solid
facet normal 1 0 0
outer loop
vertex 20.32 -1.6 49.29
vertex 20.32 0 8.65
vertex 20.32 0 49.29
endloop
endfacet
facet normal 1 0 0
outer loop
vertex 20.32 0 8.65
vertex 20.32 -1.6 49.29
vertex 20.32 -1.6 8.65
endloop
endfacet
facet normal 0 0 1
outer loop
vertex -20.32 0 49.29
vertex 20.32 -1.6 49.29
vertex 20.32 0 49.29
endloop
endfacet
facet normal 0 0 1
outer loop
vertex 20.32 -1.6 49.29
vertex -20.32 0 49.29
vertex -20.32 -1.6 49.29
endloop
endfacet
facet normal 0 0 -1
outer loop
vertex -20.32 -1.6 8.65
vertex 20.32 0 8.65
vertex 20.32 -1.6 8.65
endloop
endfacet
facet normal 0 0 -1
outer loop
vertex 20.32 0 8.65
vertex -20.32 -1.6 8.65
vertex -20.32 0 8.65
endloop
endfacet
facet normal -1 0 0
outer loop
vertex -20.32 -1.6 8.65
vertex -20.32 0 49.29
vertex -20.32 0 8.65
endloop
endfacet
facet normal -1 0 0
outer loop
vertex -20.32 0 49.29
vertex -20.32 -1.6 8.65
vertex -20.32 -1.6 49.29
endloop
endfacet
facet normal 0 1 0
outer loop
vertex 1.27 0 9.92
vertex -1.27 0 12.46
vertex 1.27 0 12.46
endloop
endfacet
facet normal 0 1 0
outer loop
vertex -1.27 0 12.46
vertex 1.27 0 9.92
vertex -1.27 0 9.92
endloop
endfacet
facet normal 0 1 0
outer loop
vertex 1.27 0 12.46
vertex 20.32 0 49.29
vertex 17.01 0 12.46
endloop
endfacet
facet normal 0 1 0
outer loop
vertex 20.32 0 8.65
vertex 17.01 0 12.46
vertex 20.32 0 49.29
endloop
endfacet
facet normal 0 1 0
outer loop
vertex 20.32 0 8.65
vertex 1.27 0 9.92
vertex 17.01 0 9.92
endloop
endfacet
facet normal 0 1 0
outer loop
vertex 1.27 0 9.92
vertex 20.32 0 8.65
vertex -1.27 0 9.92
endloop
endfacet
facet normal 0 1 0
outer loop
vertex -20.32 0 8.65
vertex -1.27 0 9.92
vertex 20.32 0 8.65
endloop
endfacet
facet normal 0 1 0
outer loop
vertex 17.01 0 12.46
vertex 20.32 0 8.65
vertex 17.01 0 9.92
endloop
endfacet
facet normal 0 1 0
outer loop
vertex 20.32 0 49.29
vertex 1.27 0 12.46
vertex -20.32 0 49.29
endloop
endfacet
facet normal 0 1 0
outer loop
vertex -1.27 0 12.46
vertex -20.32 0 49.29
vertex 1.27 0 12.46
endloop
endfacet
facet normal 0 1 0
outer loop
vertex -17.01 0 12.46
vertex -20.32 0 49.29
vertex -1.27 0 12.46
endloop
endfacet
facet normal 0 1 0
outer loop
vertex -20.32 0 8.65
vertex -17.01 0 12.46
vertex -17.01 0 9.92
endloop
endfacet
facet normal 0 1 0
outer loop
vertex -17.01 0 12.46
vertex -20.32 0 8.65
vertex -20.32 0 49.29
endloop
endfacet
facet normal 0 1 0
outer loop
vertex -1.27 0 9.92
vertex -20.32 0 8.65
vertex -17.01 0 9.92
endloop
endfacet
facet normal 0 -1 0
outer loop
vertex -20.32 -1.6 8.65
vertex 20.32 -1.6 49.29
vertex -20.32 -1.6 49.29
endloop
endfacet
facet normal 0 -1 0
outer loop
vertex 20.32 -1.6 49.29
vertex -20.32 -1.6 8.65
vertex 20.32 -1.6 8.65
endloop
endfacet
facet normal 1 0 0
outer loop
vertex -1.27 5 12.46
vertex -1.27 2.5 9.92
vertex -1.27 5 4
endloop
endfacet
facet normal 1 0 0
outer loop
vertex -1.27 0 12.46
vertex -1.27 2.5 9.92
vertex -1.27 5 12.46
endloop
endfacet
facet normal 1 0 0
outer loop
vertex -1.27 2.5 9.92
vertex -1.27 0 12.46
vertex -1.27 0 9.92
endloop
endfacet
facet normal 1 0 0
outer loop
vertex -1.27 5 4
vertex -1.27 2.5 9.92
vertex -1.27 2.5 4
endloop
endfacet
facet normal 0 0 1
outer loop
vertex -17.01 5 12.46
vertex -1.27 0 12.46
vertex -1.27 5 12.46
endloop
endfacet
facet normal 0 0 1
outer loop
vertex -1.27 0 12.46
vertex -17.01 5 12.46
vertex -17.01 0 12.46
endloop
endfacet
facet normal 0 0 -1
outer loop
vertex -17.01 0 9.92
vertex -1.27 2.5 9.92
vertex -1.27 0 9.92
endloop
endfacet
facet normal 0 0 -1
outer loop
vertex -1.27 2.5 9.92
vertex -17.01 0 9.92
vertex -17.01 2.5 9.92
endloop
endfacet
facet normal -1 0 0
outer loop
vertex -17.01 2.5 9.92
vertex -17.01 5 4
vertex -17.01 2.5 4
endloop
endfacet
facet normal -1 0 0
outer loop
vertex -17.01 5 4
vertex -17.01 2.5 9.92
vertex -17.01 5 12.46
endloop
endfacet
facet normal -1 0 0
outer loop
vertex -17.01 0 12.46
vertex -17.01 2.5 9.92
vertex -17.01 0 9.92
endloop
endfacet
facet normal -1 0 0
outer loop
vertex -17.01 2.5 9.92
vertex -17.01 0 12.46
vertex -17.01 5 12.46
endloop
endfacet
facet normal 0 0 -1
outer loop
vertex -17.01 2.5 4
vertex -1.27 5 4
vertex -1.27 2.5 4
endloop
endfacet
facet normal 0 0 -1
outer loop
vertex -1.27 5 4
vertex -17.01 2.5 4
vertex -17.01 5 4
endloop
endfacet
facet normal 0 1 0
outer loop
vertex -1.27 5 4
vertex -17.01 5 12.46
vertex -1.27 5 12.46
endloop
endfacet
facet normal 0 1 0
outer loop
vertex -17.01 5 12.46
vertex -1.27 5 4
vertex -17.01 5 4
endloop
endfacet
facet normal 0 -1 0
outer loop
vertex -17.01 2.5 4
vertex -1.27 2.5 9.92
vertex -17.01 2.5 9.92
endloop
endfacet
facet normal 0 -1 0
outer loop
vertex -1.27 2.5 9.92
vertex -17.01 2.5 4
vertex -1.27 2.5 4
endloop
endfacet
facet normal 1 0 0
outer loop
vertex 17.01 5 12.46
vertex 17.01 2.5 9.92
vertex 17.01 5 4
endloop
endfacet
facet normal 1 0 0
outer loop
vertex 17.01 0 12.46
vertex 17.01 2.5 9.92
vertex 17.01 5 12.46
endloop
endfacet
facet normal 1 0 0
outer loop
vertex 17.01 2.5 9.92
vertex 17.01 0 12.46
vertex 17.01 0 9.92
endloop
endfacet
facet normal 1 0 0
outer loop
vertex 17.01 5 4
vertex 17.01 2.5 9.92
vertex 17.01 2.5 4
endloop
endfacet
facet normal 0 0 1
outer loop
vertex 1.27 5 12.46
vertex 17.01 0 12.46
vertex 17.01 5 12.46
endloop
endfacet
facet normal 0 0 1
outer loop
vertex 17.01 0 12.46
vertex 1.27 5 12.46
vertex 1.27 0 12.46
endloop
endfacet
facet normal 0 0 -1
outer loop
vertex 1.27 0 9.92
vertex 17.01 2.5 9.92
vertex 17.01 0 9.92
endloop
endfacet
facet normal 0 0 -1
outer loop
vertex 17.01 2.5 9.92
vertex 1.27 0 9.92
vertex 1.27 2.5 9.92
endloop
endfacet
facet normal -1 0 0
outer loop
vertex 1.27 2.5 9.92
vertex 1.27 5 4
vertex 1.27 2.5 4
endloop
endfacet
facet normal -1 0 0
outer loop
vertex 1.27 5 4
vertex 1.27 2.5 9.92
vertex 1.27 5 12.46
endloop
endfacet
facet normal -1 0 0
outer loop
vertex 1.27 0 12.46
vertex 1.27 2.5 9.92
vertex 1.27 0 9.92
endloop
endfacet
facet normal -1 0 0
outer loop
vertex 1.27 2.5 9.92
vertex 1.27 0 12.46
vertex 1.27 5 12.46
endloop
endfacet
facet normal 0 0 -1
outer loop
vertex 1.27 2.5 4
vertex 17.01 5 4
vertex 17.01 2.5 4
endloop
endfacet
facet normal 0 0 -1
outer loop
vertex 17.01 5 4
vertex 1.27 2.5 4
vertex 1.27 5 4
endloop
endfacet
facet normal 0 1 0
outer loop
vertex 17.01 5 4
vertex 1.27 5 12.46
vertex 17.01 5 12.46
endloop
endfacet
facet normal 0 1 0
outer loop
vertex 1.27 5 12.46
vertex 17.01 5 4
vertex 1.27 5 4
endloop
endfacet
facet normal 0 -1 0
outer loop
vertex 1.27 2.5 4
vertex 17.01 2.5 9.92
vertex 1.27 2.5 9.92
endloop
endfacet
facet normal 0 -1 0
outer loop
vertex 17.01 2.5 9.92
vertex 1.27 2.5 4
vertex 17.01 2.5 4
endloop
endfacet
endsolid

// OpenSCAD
// file: measurements.scad
function cartridge_pad_spacing() = 2.54;

function cartridge_wall_sides() = 32;
function cartridge_pcb_width() = cartridge_pad_spacing() * 16;
function cartridge_pcb_height() = cartridge_pad_spacing() * 16;
function cartridge_pcb_thickness() = 1.6;
function cartridge_pcb_margin() = 1.6;
function cartridge_pcb_tolerance() = 0.25;
function cartridge_pcb_front_clearance() = 3;
function cartridge_pcb_back_clearance() = 5;

function cartridge_connector_pin_height() = 2.5;
function cartridge_connector_stand_height() = 2.5;
function cartridge_connector_stand_width() = cartridge_pad_spacing() * 6 + 0.5;
function cartridge_connector_stand_length() = cartridge_pad_spacing();
function cartridge_connector_stand_inset() = cartridge_pad_spacing() / 2;
function cartridge_connector_pin_protrusion() = 4.4;
function cartridge_connector_pin_inset() = 4;
function cartridge_connector_tolerance() = 0.25;
function cartridge_connector_spacing() = cartridge_pad_spacing();

function cartridge_engraving_margin() = 2;
function cartridge_logo_height() = 3;
function cartridge_engraving_radius() = 2;
function cartridge_arrow_width() = 6;
function cartridge_arrow_height() = 3;
function cartridge_engraving_depth() = 0.4;
function cartridge_engraving_sides() = 32;

function cartridge_wall_thickness() = 1.6;

function cartridge_friction_fit_tolerance() = -0.05;

function cartridge_width() = cartridge_wall_thickness() + cartridge_pcb_tolerance() + cartridge_pcb_width() + cartridge_pcb_tolerance() + cartridge_wall_thickness();
function cartridge_height() = cartridge_connector_pin_inset() + cartridge_connector_pin_protrusion() + cartridge_pcb_height() + cartridge_pcb_tolerance() + cartridge_wall_thickness();
function cartridge_depth() = cartridge_engraving_depth() + cartridge_wall_thickness() + cartridge_pcb_front_clearance() + cartridge_pcb_tolerance() + cartridge_pcb_thickness() + cartridge_pcb_tolerance() + cartridge_pcb_back_clearance() + cartridge_wall_thickness();

function cartridge_slot_tolerance() = 0.175;
// main file
use <measurements.scad>;

// PCB.
translate([
  cartridge_pcb_width() / -2,
  cartridge_depth() / -2 + cartridge_engraving_depth() + cartridge_wall_thickness() + cartridge_pcb_front_clearance() + cartridge_pcb_tolerance(),
  cartridge_connector_pin_inset() + cartridge_connector_pin_protrusion() + cartridge_pcb_tolerance(),
]) {
  cube([
    cartridge_pcb_width(),
    cartridge_pcb_thickness(),
    cartridge_pcb_height(),
  ]);
};

// Left connector stand.
translate([
  - cartridge_connector_stand_width() - cartridge_connector_spacing() / 2,
  cartridge_depth() / -2 + cartridge_engraving_depth() + cartridge_wall_thickness() + cartridge_pcb_front_clearance() + cartridge_pcb_tolerance() + cartridge_pcb_thickness(),
  cartridge_connector_pin_inset() + cartridge_connector_pin_protrusion() + cartridge_pcb_tolerance() + cartridge_connector_stand_inset(),
]) {
  cube([
    cartridge_connector_stand_width(),
    cartridge_connector_stand_length(),
    cartridge_connector_stand_length(),
  ]);
};

// Left connector pins.
translate([
  - cartridge_connector_stand_width() - cartridge_connector_spacing() / 2,
  cartridge_depth() / -2 + cartridge_engraving_depth() + cartridge_wall_thickness() + cartridge_pcb_front_clearance() + cartridge_pcb_tolerance() + cartridge_pcb_thickness() + cartridge_connector_stand_height(),
  cartridge_connector_pin_inset(),
]) {
  cube([
    cartridge_connector_stand_width(),
    cartridge_connector_pin_height(),
    cartridge_connector_pin_protrusion() + cartridge_pcb_tolerance() + cartridge_connector_stand_inset() + cartridge_connector_stand_length(),
  ]);
};

// Right connector stand.
translate([
  cartridge_connector_spacing() / 2,
  cartridge_depth() / -2 + cartridge_engraving_depth() + cartridge_wall_thickness() + cartridge_pcb_front_clearance() + cartridge_pcb_tolerance() + cartridge_pcb_thickness(),
  cartridge_connector_pin_inset() + cartridge_connector_pin_protrusion() + cartridge_pcb_tolerance() + cartridge_connector_stand_inset(),
]) {
  cube([
    cartridge_connector_stand_width(),
    cartridge_connector_stand_length(),
    cartridge_connector_stand_length(),
  ]);
};

// Right connector pins.
translate([
  cartridge_connector_spacing() / 2,
  cartridge_depth() / -2 + cartridge_engraving_depth() + cartridge_wall_thickness() + cartridge_pcb_front_clearance() + cartridge_pcb_tolerance() + cartridge_pcb_thickness() + cartridge_connector_stand_height(),
  cartridge_connector_pin_inset(),
]) {
  cube([
    cartridge_connector_stand_width(),
    cartridge_connector_pin_height(),
    cartridge_connector_pin_protrusion() + cartridge_pcb_tolerance() + cartridge_connector_stand_inset() + cartridge_connector_stand_length(),
  ]);
};
